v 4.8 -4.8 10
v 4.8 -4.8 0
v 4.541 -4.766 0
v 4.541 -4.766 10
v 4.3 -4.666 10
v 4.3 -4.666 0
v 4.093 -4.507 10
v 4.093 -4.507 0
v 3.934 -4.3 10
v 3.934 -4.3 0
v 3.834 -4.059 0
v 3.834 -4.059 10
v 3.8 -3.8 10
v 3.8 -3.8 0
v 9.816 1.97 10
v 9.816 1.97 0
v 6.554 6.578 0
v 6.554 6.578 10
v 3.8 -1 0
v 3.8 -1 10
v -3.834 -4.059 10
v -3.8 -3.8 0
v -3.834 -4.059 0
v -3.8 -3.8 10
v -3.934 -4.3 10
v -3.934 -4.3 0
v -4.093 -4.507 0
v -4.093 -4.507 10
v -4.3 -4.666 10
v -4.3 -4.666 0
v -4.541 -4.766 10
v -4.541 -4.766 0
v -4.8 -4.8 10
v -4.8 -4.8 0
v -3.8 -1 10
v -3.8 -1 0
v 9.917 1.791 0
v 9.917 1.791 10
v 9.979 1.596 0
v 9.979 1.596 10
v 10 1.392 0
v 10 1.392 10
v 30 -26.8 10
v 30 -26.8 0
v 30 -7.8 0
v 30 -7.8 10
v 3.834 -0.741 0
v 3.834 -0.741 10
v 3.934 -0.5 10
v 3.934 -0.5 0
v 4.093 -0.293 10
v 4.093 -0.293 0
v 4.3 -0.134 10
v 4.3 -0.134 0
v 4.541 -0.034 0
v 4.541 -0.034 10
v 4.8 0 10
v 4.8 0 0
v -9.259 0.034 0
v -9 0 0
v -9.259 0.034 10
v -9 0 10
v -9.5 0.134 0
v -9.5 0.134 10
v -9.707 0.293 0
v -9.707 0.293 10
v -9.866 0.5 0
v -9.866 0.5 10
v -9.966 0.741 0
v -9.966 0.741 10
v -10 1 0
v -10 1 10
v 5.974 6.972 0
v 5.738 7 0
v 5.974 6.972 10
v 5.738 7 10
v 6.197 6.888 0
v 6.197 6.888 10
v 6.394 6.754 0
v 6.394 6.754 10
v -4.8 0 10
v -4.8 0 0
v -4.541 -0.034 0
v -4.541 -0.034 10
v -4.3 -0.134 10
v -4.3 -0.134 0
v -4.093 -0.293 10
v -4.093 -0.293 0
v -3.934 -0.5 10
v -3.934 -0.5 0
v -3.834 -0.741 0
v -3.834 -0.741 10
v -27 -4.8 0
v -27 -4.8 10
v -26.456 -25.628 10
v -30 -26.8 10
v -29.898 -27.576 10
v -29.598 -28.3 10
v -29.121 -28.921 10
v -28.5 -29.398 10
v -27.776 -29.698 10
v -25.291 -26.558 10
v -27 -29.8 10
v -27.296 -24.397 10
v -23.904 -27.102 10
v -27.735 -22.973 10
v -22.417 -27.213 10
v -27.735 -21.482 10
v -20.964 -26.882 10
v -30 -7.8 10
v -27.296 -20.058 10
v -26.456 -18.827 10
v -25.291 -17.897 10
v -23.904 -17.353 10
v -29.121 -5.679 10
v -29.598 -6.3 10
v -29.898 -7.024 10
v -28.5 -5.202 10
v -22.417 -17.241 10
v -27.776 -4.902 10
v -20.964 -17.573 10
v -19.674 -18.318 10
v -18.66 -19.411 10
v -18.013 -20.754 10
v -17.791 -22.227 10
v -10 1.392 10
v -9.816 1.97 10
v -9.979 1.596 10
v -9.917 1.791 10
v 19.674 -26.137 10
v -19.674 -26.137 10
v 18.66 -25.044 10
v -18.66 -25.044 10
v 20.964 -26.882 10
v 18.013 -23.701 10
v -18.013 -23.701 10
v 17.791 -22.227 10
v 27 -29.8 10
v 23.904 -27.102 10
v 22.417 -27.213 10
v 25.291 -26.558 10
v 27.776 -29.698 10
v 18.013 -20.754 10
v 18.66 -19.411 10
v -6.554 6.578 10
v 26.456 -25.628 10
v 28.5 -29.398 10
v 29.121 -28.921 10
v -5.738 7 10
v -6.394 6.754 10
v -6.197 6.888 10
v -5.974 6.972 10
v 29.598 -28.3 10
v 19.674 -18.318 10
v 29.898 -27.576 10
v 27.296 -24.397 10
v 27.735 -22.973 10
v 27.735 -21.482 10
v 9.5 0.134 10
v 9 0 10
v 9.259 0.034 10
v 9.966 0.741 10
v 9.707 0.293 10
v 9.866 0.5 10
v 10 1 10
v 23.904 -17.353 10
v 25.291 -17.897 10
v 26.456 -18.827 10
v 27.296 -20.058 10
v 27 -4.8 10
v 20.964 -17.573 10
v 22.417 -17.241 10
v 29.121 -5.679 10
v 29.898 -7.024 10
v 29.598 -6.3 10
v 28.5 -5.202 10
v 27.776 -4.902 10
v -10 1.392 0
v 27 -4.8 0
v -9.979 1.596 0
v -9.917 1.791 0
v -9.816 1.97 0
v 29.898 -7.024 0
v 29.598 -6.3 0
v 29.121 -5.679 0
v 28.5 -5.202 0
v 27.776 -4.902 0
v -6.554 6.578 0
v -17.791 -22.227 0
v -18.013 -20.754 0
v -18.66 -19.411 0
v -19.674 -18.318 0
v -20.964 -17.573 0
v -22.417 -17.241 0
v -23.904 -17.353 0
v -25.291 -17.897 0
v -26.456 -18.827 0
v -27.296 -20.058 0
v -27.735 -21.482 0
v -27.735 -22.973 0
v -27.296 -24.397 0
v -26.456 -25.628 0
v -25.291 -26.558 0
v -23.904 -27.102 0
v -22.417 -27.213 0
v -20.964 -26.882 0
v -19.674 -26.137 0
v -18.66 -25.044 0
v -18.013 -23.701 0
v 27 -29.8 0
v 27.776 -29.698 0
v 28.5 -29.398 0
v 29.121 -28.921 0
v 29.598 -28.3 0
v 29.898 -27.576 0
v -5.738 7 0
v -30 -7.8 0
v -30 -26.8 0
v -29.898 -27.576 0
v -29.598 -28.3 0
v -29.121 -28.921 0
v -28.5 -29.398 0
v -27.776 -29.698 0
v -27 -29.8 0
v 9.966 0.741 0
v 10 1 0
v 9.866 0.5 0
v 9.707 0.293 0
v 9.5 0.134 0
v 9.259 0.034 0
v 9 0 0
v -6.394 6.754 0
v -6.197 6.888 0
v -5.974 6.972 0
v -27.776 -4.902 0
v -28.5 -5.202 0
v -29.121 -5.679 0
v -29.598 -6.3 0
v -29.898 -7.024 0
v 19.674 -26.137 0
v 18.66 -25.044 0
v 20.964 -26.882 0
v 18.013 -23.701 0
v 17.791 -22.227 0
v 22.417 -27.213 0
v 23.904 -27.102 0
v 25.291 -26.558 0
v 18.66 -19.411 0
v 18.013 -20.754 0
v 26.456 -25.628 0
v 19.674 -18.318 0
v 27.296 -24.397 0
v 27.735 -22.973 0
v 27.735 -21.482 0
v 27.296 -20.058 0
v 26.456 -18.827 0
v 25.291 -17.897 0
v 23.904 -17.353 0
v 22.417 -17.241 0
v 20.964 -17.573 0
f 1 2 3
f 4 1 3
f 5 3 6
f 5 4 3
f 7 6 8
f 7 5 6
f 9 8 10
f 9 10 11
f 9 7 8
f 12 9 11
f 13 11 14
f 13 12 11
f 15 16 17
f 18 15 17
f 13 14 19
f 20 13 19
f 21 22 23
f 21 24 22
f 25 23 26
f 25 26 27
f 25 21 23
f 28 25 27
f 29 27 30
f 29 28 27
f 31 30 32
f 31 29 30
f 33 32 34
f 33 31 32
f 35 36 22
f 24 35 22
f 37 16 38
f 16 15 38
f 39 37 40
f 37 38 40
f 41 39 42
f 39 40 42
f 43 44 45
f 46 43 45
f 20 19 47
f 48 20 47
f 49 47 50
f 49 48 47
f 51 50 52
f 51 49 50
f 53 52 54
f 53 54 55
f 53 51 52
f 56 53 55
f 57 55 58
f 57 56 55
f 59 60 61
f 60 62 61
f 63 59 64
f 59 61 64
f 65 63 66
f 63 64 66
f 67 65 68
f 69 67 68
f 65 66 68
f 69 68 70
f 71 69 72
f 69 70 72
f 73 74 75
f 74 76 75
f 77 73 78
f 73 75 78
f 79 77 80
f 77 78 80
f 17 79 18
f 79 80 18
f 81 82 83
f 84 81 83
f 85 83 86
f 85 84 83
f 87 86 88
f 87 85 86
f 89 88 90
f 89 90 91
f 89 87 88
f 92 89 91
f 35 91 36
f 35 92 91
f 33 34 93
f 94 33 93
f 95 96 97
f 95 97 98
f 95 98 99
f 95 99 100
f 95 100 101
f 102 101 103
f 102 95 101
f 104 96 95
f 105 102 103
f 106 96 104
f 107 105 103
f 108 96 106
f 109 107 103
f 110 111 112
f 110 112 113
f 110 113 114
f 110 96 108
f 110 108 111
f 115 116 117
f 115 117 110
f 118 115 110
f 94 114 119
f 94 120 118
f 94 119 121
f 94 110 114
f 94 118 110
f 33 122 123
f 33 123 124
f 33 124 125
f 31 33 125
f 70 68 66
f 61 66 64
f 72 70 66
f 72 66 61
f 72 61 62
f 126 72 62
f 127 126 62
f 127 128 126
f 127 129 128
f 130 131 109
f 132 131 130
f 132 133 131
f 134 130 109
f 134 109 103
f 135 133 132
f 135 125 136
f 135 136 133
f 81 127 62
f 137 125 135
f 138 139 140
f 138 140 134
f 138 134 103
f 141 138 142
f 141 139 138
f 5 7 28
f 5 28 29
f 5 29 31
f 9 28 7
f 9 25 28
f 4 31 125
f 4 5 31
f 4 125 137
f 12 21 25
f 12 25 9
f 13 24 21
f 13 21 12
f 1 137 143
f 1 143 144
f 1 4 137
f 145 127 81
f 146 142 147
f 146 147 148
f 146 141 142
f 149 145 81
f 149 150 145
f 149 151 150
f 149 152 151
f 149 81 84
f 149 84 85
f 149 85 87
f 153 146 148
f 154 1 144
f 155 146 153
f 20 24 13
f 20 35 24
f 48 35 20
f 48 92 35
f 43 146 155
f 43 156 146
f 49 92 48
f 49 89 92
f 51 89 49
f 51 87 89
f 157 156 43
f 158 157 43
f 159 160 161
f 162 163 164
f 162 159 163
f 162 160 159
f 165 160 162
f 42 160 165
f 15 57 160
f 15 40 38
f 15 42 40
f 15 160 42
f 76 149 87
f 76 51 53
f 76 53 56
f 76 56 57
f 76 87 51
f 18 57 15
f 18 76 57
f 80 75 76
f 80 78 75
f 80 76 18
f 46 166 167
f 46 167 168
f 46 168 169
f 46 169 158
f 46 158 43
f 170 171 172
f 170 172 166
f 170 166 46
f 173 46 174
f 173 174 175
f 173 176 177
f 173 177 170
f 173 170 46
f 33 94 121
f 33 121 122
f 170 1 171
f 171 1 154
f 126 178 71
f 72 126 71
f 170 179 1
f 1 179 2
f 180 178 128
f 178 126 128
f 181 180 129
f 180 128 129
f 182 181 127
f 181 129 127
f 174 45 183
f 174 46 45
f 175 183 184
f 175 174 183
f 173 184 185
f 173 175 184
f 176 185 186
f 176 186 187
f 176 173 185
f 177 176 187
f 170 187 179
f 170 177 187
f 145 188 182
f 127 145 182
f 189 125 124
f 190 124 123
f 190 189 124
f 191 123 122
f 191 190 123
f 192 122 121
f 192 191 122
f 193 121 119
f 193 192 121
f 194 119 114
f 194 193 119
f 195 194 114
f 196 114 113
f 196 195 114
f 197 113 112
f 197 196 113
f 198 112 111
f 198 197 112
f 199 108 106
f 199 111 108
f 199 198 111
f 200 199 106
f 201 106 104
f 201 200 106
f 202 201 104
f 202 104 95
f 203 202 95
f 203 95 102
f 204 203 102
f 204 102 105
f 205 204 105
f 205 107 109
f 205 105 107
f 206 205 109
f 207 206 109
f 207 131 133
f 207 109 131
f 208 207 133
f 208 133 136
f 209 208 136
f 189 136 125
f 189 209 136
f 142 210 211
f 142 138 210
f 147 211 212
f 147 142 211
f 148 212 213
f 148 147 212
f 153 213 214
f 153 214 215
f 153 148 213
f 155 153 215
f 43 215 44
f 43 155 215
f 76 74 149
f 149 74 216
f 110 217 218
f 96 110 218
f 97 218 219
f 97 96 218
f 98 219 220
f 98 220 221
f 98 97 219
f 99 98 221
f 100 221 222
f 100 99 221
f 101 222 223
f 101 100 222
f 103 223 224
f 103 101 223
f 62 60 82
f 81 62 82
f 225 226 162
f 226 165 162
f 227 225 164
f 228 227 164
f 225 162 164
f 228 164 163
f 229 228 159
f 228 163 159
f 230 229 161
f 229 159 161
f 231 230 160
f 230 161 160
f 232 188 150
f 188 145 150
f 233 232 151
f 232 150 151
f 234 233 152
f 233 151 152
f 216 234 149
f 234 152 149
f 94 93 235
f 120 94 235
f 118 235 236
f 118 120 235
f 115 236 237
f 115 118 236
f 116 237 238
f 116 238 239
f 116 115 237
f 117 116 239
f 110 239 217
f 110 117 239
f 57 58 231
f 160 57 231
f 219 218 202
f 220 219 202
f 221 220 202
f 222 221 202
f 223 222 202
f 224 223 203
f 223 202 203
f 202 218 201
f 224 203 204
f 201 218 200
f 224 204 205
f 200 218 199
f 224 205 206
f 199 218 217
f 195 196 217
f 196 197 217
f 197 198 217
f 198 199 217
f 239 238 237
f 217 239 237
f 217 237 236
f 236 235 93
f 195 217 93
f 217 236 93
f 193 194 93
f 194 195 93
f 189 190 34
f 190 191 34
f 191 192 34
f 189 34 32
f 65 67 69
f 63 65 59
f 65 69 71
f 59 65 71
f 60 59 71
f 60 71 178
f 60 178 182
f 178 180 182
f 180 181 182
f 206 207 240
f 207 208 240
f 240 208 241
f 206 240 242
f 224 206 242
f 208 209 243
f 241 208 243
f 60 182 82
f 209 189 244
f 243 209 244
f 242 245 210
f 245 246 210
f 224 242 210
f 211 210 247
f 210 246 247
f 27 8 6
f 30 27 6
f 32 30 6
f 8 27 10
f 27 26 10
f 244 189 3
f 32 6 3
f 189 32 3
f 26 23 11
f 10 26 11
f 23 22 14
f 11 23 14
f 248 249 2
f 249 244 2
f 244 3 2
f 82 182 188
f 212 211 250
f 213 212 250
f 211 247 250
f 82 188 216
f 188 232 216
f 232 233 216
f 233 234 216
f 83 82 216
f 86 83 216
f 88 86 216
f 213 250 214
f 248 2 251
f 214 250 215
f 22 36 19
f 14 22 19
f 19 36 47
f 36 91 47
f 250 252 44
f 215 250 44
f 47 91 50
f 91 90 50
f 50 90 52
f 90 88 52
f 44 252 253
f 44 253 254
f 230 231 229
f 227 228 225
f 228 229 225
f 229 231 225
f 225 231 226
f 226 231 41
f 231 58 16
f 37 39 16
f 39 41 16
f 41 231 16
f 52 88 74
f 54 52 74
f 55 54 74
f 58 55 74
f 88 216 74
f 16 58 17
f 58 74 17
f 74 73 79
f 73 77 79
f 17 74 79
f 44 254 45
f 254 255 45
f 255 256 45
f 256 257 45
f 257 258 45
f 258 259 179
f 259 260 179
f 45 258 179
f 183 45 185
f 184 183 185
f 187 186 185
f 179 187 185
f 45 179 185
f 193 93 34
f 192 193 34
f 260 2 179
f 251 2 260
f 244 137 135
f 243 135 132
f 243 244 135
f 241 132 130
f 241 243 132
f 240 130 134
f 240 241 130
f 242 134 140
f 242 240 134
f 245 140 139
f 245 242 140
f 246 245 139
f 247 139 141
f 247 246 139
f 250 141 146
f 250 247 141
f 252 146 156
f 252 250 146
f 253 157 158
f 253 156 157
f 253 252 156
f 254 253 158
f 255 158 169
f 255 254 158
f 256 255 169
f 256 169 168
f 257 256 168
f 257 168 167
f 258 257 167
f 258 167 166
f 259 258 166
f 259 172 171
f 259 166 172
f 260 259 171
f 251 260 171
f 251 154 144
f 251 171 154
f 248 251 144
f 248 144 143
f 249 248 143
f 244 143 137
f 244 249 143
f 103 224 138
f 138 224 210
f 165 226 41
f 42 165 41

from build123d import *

# Parameters (mm, degrees)
BOSS_EXTRUDE1_DEPTH = 10
BOSS_EXTRUDE2_DEPTH = 10
SKETCH5_R           = 5
CUT_EXTRUDE1_DEPTH  = 44.45158225
FILLET1_R           = 1
FILLET2_R           = 1
FILLET3_R           = 3


with BuildPart() as part:
    # Sketch2 → Boss-Extrude1 (new body)
    with BuildSketch(Plane.XY):
        Polygon((-10, 0), (0, 0), (0, 7), (-6.25480432, 7), (-10, 1.709943763), align=None)
        Polygon((0, 0), (10, 0), (10, 1.709943763), (6.25480432, 7), (0, 7), align=None)
    extrude(amount=BOSS_EXTRUDE1_DEPTH)

    # Sketch4 → Boss-Extrude2 (add)
    with BuildSketch(Plane.XY):
        Polygon((0, 0), (-3.8, 0), (-3.8, -4.8), (-30, -4.8), (-30, -22.686959784), (-30, -23.48), (-30, -29.8), (0, -29.8), align=None)
        Polygon((3.8, 0), (0, 0), (0, -29.8), (30, -29.8), (30, -23.48), (30, -22.686959784), (30, -4.8), (3.8, -4.8), align=None)
    extrude(amount=BOSS_EXTRUDE2_DEPTH)

    # Sketch5 → Cut-Extrude1 (cut, through all)
    with BuildSketch(Plane.XY):
        with Locations((-22.790976064, -22.227391232)):
            Circle(SKETCH5_R)
        with Locations(Location((22.790976064, -22.227391232, 0), (0, 0, 180))):
            Circle(SKETCH5_R)
    extrude(amount=CUT_EXTRUDE1_DEPTH, mode=Mode.SUBTRACT)

    # Fillet1
    fillet1_edges = [part.edges().sort_by_distance(p)[0] for p in [
        (-10, 0, 5),
        (-10, 1.709943763, 5),
        (-6.25480432, 7, 5),
        (6.25480432, 7, 5),
        (10, 1.709943763, 5),
        (10, 0, 5),
    ]]
    fillet(fillet1_edges, radius=FILLET1_R)

    # Fillet2
    fillet2_edges = [part.edges().sort_by_distance(p)[0] for p in [
        (3.8, -4.8, 5),
        (3.8, 0, 5),
        (-3.8, 0, 5),
        (-3.8, -4.8, 5),
    ]]
    fillet(fillet2_edges, radius=FILLET2_R)

    # Fillet3
    fillet3_edges = [part.edges().sort_by_distance(p)[0] for p in [
        (-30, -29.8, 5),
        (30, -29.8, 5),
        (30, -4.8, 5),
        (-30, -4.8, 5),
    ]]
    fillet(fillet3_edges, radius=FILLET3_R)


solid = part.part
